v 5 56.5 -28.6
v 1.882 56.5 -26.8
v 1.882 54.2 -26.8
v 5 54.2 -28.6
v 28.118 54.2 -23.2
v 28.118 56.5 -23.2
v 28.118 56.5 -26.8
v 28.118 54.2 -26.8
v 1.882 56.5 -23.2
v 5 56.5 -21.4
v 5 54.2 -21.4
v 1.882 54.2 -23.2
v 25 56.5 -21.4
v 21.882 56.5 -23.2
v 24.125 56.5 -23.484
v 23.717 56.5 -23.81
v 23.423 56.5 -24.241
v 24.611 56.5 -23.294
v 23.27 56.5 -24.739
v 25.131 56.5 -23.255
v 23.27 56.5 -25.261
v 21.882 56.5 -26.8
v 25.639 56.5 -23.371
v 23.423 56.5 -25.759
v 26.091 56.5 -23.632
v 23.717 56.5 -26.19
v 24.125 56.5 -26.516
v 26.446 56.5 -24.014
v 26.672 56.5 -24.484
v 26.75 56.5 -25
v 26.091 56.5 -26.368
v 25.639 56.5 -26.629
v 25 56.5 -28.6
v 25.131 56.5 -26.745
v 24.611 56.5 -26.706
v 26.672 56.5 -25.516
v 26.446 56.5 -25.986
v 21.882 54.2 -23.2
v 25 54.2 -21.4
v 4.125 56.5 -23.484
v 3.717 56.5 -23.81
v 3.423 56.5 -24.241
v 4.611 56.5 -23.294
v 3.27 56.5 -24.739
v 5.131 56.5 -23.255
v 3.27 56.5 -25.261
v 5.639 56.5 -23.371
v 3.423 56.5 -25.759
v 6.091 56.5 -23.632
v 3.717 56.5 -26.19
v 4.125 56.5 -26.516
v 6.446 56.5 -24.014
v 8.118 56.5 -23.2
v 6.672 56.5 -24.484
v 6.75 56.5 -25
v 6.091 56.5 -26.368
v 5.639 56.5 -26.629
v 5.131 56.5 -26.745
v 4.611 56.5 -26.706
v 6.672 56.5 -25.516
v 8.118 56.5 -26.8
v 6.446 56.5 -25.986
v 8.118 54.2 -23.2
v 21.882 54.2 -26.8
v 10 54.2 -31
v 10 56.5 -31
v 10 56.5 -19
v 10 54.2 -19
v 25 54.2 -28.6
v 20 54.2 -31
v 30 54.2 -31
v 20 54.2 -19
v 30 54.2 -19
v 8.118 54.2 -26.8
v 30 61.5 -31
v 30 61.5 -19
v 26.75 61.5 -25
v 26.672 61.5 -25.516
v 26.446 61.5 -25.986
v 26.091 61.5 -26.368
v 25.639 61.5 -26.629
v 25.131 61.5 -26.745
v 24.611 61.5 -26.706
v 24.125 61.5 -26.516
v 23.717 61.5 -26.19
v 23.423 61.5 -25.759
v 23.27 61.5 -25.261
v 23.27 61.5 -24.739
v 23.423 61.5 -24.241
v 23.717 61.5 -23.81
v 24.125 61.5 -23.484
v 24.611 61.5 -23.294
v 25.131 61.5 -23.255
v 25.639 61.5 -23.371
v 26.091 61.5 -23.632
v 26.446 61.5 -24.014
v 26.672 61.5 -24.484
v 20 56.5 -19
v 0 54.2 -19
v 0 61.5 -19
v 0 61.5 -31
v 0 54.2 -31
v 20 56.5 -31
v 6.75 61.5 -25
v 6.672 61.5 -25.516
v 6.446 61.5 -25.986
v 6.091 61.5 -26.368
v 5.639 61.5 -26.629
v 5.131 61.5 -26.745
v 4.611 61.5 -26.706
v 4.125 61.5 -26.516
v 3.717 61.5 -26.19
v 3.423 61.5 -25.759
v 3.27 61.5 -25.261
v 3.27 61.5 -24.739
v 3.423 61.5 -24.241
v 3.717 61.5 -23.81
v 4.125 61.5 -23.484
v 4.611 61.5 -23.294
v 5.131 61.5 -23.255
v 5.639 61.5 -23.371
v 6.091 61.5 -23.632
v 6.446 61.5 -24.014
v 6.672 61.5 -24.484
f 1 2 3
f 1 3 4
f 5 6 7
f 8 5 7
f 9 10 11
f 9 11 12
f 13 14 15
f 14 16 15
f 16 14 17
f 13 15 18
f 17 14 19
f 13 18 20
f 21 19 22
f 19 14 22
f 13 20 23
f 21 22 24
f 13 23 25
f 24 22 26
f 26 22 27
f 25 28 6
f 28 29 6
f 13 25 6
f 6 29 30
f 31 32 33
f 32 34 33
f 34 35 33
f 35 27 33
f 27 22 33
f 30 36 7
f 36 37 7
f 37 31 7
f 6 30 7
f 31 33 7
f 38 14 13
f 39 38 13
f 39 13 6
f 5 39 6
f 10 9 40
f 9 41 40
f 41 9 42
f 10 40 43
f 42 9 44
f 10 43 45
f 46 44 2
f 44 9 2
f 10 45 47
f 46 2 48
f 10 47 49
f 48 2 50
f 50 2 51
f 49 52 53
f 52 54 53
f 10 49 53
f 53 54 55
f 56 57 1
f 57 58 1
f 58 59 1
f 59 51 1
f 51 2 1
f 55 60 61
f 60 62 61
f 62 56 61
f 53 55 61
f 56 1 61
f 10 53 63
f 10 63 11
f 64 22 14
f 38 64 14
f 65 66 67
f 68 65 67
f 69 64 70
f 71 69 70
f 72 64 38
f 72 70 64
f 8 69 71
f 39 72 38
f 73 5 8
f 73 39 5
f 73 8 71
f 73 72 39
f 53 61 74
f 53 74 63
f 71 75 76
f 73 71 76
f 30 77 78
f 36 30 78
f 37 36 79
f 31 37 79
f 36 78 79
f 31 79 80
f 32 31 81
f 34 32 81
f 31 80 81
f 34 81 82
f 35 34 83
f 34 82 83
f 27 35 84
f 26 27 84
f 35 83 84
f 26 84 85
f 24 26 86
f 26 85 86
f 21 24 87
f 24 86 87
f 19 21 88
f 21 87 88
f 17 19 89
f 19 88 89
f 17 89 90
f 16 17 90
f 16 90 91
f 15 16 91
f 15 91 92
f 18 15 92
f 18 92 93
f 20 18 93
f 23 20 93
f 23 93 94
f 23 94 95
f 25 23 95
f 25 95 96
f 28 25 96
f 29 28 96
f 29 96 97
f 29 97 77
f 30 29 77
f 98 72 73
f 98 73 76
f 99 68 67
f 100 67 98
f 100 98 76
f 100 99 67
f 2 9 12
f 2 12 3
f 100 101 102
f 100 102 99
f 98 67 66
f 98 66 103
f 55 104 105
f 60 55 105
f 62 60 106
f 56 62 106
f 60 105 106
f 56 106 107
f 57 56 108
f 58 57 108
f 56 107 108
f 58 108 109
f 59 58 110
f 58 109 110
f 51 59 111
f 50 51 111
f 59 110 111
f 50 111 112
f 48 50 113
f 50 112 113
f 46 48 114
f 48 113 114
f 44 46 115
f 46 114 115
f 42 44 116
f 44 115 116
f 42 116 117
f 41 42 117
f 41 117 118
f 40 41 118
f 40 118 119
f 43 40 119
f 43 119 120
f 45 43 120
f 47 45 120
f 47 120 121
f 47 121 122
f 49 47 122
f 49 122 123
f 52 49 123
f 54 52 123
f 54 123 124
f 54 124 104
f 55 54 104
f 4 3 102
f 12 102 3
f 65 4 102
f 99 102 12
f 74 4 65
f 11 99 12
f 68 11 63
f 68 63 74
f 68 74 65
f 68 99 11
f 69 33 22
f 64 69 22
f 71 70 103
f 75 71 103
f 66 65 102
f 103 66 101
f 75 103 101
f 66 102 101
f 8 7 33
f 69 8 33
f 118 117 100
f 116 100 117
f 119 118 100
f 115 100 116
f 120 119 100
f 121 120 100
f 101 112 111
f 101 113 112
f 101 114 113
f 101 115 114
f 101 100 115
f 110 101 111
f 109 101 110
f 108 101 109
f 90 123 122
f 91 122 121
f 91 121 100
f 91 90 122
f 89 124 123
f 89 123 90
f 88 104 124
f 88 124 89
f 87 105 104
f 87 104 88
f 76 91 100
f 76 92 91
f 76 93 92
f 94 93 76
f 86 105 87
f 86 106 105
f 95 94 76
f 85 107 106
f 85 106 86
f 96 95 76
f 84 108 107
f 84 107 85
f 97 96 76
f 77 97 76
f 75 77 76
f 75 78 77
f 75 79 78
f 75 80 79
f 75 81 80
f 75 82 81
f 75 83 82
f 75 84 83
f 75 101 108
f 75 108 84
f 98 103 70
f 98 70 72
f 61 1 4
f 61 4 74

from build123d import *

# Parameters (mm, degrees)
SKETCH_1_W           = 30
SKETCH_1_H           = 61.5
EXTRUDE_1_DEPTH      = 5
SKETCH_2_R           = 1.75
SKETCH_2_W           = 21
SKETCH_2_H           = 41
CUT_EXTRUDE_1_DEPTH  = 6
SKETCH_3_W           = 30
SKETCH_3_H           = 40
EXTRUDE_2_DEPTH      = 5
SKETCH_4_R           = 1.75
CUT_EXTRUDE_2_DEPTH  = 62.5
SKETCH_5_W           = 10
SKETCH_5_H           = 12
EXTRUDE_3_DEPTH      = 2.3
SKETCH_6_W           = 30
SKETCH_6_H           = 12
EXTRUDE_4_DEPTH      = 4
EXTRUDE_5_DEPTH      = 4.5
FILLET_1_R           = 5
SKETCH_8_W           = 21
SKETCH_8_H           = 6
CUT_EXTRUDE_3_DEPTH  = 10
SKETCH_9_OUTSIDE_W   = 63.988
SKETCH_9_OUTSIDE_H   = 84.488
SKETCH_9_OUTSIDE_W_2 = 12
SKETCH_9_OUTSIDE_H_2 = 7.3
CUT_EXTRUDE_4_DEPTH  = 31


with BuildPart() as part:
    # ｽｹｯﾁ1 → ﾎﾞｽ - 押し出し1 (new body)
    with BuildSketch(Plane.XY):
        with Locations((15, 30.75)):
            Rectangle(SKETCH_1_W, SKETCH_1_H)
    extrude(amount=EXTRUDE_1_DEPTH)

    # ｽｹｯﾁ2 → ｶｯﾄ - 押し出し1 (cut, through all)
    with BuildSketch(Plane.XY.offset(5)):
        with Locations((10, 3.5)):
            Circle(SKETCH_2_R)
        with Locations((20, 3.5)):
            Circle(SKETCH_2_R)
        with Locations((10, 53)):
            Circle(SKETCH_2_R)
        with Locations((20, 53)):
            Circle(SKETCH_2_R)
        with Locations((15, 28.2)):
            Rectangle(SKETCH_2_W, SKETCH_2_H)
    extrude(amount=-CUT_EXTRUDE_1_DEPTH, mode=Mode.SUBTRACT)

    # ｽｹｯﾁ3 → ﾎﾞｽ - 押し出し2 (add)
    with BuildSketch(Plane(origin=(0, 61.5, 0), x_dir=(1, 0, 0), z_dir=(0, 1, 0))):
        with Locations((15, 20)):
            Rectangle(SKETCH_3_W, SKETCH_3_H)
    extrude(amount=-EXTRUDE_2_DEPTH)

    # ｽｹｯﾁ4 → ｶｯﾄ - 押し出し2 (cut, through all)
    with BuildSketch(Plane(origin=(0, 61.5, 0), x_dir=(1, 0, 0), z_dir=(0, 1, 0))):
        with Locations((5, 25)):
            Circle(SKETCH_4_R)
        with Locations((25, 25)):
            Circle(SKETCH_4_R)
    extrude(amount=-CUT_EXTRUDE_2_DEPTH, mode=Mode.SUBTRACT)

    # ｽｹｯﾁ5 → ﾎﾞｽ - 押し出し3 (add)
    with BuildSketch(Plane.XZ.offset(-56.5)):
        with Locations((5, -25)):
            Rectangle(SKETCH_5_W, SKETCH_5_H)
        Polygon((5, -28.6), (8.117691454, -26.8), (8.117691454, -23.2), (5, -21.4), (1.882308546, -23.2), (1.882308546, -26.8), align=None, mode=Mode.SUBTRACT)
        with Locations((25, -25)):
            Rectangle(SKETCH_5_W, SKETCH_5_H)
        Polygon((28.117691454, -26.8), (25, -28.6), (21.882308546, -26.8), (21.882308546, -23.2), (25, -21.4), (28.117691454, -23.2), align=None, mode=Mode.SUBTRACT)
    extrude(amount=EXTRUDE_3_DEPTH)

    # ｽｹｯﾁ6 → ﾎﾞｽ - 押し出し4 (add)
    with BuildSketch(Plane(origin=(0, 61.5, 0), x_dir=(1, 0, 0), z_dir=(0, 1, 0))):
        with Locations((15, 1)):
            Rectangle(SKETCH_6_W, SKETCH_6_H)
    extrude(amount=EXTRUDE_4_DEPTH)

    # ｽｹｯﾁ7 → ﾎﾞｽ - 押し出し5 (add)
    with BuildSketch(Plane(origin=(30, 0, 0), x_dir=(0, 0, -1), z_dir=(1, 0, 0))):
        Polygon((40, 56.5), (40, 39.5), (0, 9.822580645), (0, 21.5), (31, 44.5), (31, 56.5), align=None)
    extrude_5 = extrude(amount=-EXTRUDE_5_DEPTH)

    # ﾐﾗｰ1: ﾎﾞｽ - 押し出し5 across plane
    add(extrude_5.mirror(Plane.ZY.offset(-15)))

    # ﾌｨﾚｯﾄ1
    fillet_1_edges = [part.edges().sort_by_distance(p)[0] for p in [
        (30, 0, 2.5),
        (0, 0, 2.5),
    ]]
    fillet(fillet_1_edges, radius=FILLET_1_R)

    # ｽｹｯﾁ8 → ｶｯﾄ - 押し出し3 (cut, through all)
    with BuildSketch(Plane.XZ.offset(-56.5)):
        with Locations((15, -37)):
            Rectangle(SKETCH_8_W, SKETCH_8_H)
    extrude(amount=-CUT_EXTRUDE_3_DEPTH, mode=Mode.SUBTRACT)

    # ｽｹｯﾁ9 outside → ｶｯﾄ - 押し出し4 (cut, through all)
    with BuildSketch(Plane.ZY):
        with Locations((-17.5, 32.75)):
            Rectangle(SKETCH_9_OUTSIDE_W, SKETCH_9_OUTSIDE_H)
        with Locations((-25, 57.85)):
            Rectangle(SKETCH_9_OUTSIDE_W_2, SKETCH_9_OUTSIDE_H_2, mode=Mode.SUBTRACT)
    extrude(amount=-CUT_EXTRUDE_4_DEPTH, mode=Mode.SUBTRACT)


solid = part.part
